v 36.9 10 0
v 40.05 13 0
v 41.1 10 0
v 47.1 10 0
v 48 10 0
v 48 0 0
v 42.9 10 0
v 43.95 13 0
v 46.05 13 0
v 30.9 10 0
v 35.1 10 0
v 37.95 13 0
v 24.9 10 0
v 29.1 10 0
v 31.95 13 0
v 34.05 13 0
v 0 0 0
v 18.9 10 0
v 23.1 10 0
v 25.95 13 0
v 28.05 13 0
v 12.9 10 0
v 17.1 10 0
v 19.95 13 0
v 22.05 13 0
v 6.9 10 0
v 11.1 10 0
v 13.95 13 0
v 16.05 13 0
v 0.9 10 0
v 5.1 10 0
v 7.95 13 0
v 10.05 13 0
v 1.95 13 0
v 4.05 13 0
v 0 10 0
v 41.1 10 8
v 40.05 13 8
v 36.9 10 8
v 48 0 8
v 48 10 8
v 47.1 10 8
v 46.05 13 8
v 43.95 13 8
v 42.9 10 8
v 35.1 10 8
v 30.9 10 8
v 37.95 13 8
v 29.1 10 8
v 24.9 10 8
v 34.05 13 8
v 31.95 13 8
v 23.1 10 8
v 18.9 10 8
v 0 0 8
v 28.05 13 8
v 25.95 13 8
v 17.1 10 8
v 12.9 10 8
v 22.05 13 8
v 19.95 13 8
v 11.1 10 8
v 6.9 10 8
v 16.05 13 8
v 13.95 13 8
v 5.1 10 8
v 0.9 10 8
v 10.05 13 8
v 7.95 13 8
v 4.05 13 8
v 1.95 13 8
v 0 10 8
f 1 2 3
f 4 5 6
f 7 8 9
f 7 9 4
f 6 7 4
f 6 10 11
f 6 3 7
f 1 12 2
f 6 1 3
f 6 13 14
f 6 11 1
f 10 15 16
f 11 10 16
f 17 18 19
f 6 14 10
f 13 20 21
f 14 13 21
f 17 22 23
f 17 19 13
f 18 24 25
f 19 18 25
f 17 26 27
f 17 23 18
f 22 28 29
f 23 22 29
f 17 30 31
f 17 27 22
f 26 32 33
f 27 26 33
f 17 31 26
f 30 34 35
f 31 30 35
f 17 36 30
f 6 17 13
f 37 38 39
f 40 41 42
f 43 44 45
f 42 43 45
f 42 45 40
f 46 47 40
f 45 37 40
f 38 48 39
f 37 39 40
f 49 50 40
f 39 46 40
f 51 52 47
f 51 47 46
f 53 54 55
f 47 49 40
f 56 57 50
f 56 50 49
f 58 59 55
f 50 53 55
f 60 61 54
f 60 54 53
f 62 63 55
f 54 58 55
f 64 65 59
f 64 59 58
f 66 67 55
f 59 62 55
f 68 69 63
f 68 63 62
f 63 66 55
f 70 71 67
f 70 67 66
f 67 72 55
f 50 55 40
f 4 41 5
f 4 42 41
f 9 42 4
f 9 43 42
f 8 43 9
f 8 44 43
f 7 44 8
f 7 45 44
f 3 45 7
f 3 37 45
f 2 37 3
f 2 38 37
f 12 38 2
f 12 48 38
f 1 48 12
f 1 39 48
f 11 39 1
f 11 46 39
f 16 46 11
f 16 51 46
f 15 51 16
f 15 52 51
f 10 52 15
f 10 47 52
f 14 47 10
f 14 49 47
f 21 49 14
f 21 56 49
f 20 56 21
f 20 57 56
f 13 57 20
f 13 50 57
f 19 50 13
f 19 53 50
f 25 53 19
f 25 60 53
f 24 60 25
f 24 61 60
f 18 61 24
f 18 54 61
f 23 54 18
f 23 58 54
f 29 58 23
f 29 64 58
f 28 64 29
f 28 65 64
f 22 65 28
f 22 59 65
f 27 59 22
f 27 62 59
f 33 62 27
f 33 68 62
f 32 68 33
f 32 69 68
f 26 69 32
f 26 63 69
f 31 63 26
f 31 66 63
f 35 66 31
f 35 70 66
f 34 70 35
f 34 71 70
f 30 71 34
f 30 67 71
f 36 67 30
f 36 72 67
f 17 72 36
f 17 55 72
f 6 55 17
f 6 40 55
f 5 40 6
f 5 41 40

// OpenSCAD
$fn = 32;

// ----------------------------------------------------------------------
// Gear rack: 8 teeth, pitch 6 mm
// ----------------------------------------------------------------------

// --- parameters (mm) ---
teeth = 8;                // number of teeth
pitch = 6;                // tooth pitch, X
root_w = 4.2;             // tooth width at the root
tip_w = 2.1;              // tooth width at the tip
base_h = 10;              // rack body height, Y
tooth_h = 3;              // tooth height above the body
plate_t = 8;              // rack width, Z (extrusion height)

rack_l = teeth * pitch;  // overall length
total_h = base_h + tooth_h;  // overall height

profile = [[0, 0], [48, 0], [48, 10], [47.1, 10], [46.05, 13], [43.95, 13], [42.9, 10], [41.1, 10], [40.05, 13], [37.95, 13], [36.9, 10], [35.1, 10], [34.05, 13], [31.95, 13], [30.9, 10], [29.1, 10], [28.05, 13], [25.95, 13], [24.9, 10], [23.1, 10], [22.05, 13], [19.95, 13], [18.9, 10], [17.1, 10], [16.05, 13], [13.95, 13], [12.9, 10], [11.1, 10], [10.05, 13], [7.95, 13], [6.9, 10], [5.1, 10], [4.05, 13], [1.95, 13], [0.9, 10], [0, 10]];  // primary outline, 36 points, counter clockwise

// --- the one profile operation ---
linear_extrude(height = plate_t) polygon(points = profile);
